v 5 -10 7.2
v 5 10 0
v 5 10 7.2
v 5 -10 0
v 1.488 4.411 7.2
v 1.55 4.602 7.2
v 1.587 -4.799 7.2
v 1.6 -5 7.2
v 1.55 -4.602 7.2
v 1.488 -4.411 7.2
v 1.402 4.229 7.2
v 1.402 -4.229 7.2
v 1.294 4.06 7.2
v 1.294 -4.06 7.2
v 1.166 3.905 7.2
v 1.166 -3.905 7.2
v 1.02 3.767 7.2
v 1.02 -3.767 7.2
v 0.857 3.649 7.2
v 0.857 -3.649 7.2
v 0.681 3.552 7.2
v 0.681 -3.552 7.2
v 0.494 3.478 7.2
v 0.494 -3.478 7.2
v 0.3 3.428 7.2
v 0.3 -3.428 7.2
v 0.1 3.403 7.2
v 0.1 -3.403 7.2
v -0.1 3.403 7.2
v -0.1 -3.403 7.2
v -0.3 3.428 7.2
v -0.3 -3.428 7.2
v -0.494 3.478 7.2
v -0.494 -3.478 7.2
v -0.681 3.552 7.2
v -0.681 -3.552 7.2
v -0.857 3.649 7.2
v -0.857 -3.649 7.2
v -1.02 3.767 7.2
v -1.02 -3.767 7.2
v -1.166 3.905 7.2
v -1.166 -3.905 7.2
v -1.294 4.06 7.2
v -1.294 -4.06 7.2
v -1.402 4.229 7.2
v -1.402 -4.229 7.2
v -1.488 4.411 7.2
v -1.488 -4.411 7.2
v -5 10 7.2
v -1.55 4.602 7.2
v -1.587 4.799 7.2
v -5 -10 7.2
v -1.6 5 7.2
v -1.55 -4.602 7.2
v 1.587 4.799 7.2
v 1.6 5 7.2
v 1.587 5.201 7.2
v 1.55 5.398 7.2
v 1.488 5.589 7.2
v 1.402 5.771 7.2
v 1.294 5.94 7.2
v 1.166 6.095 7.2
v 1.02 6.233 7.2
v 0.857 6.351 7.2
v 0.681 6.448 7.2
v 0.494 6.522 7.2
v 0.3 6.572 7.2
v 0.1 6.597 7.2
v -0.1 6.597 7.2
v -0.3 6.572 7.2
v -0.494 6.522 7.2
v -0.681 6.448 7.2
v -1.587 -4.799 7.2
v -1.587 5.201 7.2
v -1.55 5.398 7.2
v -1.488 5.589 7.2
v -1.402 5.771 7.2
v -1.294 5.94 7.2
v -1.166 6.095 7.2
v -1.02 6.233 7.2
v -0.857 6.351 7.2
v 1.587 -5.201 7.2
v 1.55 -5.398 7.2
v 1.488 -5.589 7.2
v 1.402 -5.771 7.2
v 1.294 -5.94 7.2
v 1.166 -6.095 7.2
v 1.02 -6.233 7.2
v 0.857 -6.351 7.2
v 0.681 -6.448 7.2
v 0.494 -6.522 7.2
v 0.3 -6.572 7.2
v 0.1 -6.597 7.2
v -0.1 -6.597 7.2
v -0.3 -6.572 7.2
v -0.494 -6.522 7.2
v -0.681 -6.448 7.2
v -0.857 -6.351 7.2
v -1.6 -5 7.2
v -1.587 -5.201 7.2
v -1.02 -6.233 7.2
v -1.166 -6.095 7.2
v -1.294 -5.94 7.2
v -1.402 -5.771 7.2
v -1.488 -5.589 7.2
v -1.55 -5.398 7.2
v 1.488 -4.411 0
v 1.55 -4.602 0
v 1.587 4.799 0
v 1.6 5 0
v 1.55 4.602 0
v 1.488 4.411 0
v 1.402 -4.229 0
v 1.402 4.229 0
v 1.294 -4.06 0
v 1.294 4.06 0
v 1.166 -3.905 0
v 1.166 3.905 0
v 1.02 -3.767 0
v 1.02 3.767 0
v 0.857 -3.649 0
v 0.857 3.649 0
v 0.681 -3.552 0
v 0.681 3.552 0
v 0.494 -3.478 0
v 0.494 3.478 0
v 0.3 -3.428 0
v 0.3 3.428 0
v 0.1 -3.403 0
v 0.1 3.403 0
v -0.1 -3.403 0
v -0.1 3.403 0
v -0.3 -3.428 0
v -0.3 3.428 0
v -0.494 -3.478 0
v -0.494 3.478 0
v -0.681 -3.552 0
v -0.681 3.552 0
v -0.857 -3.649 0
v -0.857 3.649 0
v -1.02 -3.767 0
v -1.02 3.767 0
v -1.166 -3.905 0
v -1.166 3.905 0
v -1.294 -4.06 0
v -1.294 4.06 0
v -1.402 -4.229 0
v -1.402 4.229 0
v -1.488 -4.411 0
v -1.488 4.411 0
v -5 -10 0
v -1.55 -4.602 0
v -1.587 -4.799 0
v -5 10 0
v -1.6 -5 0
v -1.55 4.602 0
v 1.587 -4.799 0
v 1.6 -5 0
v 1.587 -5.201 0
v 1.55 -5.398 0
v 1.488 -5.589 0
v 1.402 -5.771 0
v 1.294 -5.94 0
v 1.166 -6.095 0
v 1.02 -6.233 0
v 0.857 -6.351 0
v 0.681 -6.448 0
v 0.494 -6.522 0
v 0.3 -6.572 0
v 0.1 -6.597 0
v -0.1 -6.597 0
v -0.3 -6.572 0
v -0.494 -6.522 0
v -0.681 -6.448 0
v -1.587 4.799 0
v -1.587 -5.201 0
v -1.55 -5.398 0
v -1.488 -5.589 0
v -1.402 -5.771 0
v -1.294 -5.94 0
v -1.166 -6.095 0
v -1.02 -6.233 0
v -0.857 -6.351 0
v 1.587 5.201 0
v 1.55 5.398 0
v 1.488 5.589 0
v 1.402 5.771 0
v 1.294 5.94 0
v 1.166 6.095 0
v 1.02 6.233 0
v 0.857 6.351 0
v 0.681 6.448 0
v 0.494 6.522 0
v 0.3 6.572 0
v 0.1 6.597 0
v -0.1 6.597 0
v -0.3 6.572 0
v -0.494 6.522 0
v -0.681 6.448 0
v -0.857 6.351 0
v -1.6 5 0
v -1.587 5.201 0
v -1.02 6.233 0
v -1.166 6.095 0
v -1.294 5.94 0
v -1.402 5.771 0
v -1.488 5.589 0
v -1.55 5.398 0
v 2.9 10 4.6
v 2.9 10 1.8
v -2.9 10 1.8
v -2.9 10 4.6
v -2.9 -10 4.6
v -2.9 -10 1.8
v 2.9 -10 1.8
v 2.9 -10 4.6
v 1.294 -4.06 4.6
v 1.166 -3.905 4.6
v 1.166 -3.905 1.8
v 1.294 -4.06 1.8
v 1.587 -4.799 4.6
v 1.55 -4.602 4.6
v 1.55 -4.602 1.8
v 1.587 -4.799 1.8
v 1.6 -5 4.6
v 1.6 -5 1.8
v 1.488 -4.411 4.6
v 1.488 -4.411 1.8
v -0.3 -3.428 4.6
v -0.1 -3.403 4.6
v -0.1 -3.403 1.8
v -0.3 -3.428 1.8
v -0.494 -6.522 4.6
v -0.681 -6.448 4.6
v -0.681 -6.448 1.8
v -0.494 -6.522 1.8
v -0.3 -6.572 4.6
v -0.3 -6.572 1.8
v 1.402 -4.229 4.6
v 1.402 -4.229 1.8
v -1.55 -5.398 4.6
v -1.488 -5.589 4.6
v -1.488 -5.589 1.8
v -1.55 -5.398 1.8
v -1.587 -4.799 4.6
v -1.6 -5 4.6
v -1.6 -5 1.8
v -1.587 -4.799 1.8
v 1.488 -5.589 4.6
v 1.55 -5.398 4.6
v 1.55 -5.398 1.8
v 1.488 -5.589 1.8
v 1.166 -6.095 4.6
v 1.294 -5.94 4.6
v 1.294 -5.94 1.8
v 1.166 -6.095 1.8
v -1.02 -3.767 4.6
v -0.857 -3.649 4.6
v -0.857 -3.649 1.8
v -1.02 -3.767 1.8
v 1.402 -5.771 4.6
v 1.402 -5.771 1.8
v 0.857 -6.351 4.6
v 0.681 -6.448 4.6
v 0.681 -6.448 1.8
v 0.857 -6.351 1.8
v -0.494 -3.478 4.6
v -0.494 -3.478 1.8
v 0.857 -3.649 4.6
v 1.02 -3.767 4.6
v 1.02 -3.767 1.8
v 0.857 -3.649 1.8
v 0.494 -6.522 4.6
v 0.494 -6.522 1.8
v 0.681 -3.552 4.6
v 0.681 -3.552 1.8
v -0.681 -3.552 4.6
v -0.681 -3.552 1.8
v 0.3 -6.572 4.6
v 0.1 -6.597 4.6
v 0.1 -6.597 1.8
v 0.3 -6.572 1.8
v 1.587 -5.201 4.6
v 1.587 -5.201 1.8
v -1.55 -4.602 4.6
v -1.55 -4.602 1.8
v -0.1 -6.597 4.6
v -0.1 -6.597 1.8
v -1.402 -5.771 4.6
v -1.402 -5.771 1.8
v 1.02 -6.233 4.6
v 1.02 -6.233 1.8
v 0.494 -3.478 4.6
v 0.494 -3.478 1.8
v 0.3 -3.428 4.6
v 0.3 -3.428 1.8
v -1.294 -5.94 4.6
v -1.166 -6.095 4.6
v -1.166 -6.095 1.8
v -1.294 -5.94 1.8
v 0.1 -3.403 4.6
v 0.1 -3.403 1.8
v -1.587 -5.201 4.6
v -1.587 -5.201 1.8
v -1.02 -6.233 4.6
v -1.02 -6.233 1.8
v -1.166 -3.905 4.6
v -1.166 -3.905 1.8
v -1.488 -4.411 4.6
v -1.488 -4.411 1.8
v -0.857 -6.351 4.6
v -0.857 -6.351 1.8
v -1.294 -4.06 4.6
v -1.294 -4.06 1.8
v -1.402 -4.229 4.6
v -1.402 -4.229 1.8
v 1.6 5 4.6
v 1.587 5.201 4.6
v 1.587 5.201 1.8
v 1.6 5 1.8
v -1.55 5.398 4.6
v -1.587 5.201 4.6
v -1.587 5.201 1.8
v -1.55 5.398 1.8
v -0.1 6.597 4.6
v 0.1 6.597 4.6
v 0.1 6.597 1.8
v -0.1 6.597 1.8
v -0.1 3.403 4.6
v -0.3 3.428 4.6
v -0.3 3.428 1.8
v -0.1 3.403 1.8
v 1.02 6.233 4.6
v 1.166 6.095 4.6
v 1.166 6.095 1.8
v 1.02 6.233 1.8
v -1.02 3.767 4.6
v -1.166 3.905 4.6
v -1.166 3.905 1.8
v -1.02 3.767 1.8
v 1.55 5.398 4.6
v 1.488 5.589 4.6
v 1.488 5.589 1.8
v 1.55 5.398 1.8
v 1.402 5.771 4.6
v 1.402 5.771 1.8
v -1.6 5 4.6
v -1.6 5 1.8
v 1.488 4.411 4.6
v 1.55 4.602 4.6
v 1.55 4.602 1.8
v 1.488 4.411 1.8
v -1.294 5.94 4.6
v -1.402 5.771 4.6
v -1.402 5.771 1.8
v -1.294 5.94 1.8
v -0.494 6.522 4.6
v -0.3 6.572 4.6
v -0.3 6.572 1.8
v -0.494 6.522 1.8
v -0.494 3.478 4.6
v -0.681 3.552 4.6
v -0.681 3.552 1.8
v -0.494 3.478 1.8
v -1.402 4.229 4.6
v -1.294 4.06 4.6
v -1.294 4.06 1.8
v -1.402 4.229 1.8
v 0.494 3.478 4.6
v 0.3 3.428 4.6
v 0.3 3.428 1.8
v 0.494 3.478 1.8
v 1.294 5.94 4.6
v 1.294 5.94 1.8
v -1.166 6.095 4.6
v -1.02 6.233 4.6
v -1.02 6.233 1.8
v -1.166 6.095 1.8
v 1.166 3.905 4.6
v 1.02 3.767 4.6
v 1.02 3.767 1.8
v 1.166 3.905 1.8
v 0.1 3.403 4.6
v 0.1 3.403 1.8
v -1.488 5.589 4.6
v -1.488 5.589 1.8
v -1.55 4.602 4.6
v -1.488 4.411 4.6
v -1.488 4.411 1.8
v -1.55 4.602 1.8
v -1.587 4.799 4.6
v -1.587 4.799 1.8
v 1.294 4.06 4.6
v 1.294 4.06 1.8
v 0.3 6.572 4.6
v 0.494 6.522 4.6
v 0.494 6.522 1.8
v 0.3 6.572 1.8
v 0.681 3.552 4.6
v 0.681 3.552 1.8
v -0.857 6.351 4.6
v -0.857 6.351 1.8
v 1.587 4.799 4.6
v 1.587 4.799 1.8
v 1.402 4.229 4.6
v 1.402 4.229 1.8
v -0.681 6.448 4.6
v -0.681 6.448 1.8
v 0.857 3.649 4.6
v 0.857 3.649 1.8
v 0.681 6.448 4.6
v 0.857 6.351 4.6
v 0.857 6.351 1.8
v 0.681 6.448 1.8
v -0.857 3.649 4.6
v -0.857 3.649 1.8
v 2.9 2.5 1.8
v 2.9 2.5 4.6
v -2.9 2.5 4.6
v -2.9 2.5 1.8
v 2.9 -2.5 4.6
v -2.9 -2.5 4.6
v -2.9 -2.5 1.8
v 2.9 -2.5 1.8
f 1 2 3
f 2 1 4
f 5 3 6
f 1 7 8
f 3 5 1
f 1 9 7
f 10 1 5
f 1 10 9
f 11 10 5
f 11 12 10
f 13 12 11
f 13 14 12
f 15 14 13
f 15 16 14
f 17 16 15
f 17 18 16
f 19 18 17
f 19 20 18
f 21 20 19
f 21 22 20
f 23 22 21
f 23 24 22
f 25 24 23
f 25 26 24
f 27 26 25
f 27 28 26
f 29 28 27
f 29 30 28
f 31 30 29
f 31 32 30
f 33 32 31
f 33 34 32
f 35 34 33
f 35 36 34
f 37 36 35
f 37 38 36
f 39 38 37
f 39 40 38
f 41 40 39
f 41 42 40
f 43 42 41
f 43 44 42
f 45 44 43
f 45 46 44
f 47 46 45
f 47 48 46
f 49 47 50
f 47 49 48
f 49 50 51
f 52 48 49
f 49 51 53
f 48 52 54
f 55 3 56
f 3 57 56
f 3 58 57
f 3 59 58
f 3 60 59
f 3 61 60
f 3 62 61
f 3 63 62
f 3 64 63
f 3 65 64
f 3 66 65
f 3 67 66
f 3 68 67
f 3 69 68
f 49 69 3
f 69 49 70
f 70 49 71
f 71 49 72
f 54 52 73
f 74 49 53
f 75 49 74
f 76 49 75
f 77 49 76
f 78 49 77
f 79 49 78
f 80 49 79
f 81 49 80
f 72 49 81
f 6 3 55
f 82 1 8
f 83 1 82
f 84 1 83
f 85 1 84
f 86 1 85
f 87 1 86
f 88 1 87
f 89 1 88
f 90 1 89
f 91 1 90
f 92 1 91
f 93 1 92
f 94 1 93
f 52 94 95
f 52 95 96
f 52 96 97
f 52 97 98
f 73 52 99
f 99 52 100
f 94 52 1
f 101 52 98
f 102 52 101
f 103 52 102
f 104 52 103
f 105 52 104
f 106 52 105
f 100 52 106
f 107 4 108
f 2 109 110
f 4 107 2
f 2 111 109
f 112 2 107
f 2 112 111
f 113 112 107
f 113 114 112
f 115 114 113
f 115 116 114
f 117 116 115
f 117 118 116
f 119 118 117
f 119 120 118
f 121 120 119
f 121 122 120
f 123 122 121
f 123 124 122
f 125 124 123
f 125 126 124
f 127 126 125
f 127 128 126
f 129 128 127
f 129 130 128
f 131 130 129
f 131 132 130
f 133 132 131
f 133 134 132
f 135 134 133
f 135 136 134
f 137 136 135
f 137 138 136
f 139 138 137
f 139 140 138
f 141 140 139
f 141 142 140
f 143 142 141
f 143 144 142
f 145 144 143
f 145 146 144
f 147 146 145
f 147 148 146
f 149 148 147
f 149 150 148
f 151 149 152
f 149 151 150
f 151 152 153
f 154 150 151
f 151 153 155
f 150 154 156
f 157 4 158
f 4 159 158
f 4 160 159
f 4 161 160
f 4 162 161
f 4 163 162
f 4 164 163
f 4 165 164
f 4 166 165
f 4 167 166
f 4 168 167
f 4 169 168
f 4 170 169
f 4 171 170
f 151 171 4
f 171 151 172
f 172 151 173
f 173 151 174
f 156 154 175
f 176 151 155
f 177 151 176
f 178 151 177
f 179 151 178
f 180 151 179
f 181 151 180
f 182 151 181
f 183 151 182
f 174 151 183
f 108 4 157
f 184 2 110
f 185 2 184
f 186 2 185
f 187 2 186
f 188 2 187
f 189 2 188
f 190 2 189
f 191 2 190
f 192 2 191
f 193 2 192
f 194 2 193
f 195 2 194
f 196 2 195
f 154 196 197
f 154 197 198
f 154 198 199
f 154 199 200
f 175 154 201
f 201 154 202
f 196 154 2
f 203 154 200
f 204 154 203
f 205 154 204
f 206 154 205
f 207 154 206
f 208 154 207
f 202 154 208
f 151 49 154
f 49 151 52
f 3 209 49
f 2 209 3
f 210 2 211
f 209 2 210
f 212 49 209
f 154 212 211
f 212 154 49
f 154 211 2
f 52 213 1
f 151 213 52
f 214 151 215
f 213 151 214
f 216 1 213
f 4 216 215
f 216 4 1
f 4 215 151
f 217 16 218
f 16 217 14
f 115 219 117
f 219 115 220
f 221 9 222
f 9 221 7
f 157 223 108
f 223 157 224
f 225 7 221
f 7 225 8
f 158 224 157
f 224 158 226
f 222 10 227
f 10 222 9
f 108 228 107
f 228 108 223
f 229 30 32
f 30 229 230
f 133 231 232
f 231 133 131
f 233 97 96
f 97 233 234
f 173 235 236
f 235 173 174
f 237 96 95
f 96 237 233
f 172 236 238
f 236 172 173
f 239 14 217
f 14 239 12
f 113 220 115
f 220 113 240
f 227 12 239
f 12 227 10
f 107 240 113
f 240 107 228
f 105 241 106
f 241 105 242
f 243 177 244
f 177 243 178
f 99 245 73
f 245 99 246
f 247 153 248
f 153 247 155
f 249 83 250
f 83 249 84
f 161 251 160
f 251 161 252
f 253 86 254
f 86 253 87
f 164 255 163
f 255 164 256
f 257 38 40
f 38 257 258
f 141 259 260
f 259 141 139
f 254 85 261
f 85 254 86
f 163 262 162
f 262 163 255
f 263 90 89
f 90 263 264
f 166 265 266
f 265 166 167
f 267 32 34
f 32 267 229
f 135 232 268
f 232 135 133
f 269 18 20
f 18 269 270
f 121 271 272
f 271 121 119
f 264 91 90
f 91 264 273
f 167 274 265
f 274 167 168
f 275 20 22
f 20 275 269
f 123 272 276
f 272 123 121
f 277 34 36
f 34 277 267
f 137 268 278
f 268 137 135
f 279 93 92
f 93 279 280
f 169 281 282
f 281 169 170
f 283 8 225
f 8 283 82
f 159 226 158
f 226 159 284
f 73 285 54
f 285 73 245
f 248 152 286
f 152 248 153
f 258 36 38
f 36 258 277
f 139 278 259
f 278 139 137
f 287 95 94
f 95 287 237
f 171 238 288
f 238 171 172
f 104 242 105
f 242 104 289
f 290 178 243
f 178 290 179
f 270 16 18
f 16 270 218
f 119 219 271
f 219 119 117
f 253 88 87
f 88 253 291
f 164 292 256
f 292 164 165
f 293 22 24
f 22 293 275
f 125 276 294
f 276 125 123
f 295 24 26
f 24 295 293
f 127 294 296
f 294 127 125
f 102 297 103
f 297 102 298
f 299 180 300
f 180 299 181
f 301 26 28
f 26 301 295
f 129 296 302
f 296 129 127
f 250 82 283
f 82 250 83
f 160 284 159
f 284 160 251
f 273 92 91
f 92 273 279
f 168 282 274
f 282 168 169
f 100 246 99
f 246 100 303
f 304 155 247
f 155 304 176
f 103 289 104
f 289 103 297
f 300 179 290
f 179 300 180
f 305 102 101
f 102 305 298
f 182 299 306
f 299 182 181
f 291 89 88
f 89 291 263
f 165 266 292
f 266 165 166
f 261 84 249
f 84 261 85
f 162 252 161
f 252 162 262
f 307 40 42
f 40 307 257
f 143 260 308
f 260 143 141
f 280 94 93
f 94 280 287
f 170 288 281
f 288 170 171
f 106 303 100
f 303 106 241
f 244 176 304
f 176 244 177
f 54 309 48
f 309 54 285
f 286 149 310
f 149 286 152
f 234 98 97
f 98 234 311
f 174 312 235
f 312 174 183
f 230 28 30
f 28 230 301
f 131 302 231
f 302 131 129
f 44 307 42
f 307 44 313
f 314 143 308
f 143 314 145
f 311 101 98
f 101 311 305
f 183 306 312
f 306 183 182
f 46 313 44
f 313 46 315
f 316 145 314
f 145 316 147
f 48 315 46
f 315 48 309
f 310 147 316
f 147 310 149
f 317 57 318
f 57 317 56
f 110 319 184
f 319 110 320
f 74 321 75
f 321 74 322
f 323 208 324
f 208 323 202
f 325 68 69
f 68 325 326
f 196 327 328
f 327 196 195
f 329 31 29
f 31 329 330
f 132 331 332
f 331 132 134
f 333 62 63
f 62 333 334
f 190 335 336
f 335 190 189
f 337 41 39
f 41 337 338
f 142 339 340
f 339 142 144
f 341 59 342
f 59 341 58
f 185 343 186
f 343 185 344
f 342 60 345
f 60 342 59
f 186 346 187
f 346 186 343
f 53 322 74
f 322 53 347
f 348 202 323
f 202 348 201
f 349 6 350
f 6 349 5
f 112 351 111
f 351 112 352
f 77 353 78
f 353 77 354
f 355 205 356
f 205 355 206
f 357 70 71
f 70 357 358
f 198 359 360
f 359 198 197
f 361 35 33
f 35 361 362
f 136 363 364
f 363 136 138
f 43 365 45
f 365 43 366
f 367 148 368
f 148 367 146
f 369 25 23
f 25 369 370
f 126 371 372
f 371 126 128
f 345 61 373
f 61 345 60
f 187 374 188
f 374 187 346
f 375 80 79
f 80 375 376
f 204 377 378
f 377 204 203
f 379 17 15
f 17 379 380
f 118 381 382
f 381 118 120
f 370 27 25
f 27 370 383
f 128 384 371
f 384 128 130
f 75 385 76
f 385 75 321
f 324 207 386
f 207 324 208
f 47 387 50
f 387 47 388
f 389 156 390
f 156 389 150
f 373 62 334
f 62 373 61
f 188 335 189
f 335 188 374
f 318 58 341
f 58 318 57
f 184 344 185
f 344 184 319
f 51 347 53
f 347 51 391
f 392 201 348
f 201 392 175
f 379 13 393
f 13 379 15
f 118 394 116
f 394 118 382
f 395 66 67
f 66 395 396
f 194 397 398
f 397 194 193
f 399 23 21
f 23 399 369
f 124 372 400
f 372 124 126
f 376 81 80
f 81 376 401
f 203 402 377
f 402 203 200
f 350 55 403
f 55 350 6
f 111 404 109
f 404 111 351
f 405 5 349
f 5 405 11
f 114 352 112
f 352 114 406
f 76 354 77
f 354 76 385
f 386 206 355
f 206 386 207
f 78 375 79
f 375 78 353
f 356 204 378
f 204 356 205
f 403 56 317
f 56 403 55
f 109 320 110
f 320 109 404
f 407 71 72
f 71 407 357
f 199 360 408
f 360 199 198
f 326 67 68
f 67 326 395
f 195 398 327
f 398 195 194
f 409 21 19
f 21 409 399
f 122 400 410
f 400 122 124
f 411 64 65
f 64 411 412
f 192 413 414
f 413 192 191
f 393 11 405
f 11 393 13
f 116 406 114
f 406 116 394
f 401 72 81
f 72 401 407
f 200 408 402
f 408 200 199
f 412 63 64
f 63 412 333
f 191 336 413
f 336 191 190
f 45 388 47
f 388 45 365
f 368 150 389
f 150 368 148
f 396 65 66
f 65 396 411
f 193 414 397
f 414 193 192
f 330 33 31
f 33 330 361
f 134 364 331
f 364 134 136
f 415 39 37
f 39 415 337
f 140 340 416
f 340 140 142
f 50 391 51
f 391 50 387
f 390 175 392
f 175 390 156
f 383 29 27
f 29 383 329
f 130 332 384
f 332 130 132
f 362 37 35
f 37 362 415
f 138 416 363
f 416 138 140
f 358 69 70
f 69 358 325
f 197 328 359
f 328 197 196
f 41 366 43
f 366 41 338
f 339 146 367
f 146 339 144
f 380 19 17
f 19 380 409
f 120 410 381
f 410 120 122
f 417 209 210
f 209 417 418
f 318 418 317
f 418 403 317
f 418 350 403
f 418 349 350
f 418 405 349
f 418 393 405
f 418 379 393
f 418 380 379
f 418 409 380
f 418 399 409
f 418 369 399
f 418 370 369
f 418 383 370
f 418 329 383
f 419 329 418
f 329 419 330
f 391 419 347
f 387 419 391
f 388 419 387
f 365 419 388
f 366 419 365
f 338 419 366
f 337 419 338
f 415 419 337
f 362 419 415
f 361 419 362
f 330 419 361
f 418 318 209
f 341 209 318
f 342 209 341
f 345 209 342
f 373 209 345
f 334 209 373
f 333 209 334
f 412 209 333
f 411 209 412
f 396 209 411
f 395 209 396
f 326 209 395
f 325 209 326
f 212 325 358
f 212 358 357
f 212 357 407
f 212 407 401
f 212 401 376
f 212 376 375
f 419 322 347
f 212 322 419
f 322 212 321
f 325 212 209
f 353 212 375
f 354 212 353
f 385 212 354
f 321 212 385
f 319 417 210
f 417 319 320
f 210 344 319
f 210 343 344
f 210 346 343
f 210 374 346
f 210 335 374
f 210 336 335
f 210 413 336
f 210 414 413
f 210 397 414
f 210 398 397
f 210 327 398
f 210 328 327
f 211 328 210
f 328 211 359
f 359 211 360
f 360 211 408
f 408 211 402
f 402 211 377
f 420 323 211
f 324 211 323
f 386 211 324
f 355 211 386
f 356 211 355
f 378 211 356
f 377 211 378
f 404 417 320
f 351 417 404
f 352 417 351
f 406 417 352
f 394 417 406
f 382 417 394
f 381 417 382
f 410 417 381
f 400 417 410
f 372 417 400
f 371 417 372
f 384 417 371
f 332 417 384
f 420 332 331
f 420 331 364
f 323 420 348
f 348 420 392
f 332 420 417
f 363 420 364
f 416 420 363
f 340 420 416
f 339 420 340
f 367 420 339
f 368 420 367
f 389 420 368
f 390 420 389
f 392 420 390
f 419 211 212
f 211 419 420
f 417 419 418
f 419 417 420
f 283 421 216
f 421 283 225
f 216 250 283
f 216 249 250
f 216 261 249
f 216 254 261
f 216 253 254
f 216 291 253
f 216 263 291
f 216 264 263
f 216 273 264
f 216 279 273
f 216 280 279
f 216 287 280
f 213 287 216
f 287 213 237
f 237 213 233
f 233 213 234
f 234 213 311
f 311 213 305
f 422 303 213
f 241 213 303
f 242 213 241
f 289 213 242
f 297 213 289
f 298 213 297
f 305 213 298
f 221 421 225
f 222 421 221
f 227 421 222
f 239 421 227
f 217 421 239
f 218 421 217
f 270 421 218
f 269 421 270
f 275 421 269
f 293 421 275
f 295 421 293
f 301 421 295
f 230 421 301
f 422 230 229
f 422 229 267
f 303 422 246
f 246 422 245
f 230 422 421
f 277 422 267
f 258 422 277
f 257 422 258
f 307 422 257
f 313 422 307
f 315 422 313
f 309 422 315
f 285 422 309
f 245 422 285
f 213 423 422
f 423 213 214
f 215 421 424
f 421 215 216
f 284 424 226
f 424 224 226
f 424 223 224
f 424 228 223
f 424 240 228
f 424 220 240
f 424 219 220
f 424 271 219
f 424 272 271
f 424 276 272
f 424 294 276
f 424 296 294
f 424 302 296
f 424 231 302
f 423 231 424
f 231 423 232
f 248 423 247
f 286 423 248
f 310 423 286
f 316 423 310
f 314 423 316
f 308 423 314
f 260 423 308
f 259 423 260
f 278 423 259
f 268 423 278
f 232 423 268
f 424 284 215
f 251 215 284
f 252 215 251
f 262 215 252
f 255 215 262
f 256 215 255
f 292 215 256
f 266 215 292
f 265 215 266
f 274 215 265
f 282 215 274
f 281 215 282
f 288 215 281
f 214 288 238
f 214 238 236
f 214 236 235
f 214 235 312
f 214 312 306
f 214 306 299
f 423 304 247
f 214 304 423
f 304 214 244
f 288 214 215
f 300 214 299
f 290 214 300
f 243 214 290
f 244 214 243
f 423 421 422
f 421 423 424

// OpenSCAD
// global parameters
thickness = 4;
delta=0.4;
// motors
space = 5.2; // motor hight
screwdim=3; // m3 screws
nut_width=5.4+delta;
nut_hight=2.4+delta;

module mount(){
     //translate([0., 0., space/2  ])cube([10, 20, space+thickness/2], center=true);
     wx = 10;
     wy = 20;
     difference(){
          translate([-wx/2, -wy/2, 0])cube([wx, wy, space+thickness/2]);
          // holes
          translate([0, -wy/4, space+10])cylinder(h=50, r=screwdim/2+0.1, center=true, $fn=50);
          translate([0, +wy/4, space+10])cylinder(h=50, r=screwdim/2+0.1, center=true, $fn=50);
          // nuts 5.4mm x 2.4mm
          translate([0, +wy/4+delta, space-2])translate([-nut_width/2, -nut_width/2, -nut_hight/2])cube([nut_width, 3*nut_width, nut_hight], center=false);
          translate([0, -wy/4-delta, space-2])rotate([0,0,180])translate([-nut_width/2, -nut_width/2, -nut_hight/2])cube([nut_width, 3*nut_width, nut_hight], center=false);

     }
}
mount();
